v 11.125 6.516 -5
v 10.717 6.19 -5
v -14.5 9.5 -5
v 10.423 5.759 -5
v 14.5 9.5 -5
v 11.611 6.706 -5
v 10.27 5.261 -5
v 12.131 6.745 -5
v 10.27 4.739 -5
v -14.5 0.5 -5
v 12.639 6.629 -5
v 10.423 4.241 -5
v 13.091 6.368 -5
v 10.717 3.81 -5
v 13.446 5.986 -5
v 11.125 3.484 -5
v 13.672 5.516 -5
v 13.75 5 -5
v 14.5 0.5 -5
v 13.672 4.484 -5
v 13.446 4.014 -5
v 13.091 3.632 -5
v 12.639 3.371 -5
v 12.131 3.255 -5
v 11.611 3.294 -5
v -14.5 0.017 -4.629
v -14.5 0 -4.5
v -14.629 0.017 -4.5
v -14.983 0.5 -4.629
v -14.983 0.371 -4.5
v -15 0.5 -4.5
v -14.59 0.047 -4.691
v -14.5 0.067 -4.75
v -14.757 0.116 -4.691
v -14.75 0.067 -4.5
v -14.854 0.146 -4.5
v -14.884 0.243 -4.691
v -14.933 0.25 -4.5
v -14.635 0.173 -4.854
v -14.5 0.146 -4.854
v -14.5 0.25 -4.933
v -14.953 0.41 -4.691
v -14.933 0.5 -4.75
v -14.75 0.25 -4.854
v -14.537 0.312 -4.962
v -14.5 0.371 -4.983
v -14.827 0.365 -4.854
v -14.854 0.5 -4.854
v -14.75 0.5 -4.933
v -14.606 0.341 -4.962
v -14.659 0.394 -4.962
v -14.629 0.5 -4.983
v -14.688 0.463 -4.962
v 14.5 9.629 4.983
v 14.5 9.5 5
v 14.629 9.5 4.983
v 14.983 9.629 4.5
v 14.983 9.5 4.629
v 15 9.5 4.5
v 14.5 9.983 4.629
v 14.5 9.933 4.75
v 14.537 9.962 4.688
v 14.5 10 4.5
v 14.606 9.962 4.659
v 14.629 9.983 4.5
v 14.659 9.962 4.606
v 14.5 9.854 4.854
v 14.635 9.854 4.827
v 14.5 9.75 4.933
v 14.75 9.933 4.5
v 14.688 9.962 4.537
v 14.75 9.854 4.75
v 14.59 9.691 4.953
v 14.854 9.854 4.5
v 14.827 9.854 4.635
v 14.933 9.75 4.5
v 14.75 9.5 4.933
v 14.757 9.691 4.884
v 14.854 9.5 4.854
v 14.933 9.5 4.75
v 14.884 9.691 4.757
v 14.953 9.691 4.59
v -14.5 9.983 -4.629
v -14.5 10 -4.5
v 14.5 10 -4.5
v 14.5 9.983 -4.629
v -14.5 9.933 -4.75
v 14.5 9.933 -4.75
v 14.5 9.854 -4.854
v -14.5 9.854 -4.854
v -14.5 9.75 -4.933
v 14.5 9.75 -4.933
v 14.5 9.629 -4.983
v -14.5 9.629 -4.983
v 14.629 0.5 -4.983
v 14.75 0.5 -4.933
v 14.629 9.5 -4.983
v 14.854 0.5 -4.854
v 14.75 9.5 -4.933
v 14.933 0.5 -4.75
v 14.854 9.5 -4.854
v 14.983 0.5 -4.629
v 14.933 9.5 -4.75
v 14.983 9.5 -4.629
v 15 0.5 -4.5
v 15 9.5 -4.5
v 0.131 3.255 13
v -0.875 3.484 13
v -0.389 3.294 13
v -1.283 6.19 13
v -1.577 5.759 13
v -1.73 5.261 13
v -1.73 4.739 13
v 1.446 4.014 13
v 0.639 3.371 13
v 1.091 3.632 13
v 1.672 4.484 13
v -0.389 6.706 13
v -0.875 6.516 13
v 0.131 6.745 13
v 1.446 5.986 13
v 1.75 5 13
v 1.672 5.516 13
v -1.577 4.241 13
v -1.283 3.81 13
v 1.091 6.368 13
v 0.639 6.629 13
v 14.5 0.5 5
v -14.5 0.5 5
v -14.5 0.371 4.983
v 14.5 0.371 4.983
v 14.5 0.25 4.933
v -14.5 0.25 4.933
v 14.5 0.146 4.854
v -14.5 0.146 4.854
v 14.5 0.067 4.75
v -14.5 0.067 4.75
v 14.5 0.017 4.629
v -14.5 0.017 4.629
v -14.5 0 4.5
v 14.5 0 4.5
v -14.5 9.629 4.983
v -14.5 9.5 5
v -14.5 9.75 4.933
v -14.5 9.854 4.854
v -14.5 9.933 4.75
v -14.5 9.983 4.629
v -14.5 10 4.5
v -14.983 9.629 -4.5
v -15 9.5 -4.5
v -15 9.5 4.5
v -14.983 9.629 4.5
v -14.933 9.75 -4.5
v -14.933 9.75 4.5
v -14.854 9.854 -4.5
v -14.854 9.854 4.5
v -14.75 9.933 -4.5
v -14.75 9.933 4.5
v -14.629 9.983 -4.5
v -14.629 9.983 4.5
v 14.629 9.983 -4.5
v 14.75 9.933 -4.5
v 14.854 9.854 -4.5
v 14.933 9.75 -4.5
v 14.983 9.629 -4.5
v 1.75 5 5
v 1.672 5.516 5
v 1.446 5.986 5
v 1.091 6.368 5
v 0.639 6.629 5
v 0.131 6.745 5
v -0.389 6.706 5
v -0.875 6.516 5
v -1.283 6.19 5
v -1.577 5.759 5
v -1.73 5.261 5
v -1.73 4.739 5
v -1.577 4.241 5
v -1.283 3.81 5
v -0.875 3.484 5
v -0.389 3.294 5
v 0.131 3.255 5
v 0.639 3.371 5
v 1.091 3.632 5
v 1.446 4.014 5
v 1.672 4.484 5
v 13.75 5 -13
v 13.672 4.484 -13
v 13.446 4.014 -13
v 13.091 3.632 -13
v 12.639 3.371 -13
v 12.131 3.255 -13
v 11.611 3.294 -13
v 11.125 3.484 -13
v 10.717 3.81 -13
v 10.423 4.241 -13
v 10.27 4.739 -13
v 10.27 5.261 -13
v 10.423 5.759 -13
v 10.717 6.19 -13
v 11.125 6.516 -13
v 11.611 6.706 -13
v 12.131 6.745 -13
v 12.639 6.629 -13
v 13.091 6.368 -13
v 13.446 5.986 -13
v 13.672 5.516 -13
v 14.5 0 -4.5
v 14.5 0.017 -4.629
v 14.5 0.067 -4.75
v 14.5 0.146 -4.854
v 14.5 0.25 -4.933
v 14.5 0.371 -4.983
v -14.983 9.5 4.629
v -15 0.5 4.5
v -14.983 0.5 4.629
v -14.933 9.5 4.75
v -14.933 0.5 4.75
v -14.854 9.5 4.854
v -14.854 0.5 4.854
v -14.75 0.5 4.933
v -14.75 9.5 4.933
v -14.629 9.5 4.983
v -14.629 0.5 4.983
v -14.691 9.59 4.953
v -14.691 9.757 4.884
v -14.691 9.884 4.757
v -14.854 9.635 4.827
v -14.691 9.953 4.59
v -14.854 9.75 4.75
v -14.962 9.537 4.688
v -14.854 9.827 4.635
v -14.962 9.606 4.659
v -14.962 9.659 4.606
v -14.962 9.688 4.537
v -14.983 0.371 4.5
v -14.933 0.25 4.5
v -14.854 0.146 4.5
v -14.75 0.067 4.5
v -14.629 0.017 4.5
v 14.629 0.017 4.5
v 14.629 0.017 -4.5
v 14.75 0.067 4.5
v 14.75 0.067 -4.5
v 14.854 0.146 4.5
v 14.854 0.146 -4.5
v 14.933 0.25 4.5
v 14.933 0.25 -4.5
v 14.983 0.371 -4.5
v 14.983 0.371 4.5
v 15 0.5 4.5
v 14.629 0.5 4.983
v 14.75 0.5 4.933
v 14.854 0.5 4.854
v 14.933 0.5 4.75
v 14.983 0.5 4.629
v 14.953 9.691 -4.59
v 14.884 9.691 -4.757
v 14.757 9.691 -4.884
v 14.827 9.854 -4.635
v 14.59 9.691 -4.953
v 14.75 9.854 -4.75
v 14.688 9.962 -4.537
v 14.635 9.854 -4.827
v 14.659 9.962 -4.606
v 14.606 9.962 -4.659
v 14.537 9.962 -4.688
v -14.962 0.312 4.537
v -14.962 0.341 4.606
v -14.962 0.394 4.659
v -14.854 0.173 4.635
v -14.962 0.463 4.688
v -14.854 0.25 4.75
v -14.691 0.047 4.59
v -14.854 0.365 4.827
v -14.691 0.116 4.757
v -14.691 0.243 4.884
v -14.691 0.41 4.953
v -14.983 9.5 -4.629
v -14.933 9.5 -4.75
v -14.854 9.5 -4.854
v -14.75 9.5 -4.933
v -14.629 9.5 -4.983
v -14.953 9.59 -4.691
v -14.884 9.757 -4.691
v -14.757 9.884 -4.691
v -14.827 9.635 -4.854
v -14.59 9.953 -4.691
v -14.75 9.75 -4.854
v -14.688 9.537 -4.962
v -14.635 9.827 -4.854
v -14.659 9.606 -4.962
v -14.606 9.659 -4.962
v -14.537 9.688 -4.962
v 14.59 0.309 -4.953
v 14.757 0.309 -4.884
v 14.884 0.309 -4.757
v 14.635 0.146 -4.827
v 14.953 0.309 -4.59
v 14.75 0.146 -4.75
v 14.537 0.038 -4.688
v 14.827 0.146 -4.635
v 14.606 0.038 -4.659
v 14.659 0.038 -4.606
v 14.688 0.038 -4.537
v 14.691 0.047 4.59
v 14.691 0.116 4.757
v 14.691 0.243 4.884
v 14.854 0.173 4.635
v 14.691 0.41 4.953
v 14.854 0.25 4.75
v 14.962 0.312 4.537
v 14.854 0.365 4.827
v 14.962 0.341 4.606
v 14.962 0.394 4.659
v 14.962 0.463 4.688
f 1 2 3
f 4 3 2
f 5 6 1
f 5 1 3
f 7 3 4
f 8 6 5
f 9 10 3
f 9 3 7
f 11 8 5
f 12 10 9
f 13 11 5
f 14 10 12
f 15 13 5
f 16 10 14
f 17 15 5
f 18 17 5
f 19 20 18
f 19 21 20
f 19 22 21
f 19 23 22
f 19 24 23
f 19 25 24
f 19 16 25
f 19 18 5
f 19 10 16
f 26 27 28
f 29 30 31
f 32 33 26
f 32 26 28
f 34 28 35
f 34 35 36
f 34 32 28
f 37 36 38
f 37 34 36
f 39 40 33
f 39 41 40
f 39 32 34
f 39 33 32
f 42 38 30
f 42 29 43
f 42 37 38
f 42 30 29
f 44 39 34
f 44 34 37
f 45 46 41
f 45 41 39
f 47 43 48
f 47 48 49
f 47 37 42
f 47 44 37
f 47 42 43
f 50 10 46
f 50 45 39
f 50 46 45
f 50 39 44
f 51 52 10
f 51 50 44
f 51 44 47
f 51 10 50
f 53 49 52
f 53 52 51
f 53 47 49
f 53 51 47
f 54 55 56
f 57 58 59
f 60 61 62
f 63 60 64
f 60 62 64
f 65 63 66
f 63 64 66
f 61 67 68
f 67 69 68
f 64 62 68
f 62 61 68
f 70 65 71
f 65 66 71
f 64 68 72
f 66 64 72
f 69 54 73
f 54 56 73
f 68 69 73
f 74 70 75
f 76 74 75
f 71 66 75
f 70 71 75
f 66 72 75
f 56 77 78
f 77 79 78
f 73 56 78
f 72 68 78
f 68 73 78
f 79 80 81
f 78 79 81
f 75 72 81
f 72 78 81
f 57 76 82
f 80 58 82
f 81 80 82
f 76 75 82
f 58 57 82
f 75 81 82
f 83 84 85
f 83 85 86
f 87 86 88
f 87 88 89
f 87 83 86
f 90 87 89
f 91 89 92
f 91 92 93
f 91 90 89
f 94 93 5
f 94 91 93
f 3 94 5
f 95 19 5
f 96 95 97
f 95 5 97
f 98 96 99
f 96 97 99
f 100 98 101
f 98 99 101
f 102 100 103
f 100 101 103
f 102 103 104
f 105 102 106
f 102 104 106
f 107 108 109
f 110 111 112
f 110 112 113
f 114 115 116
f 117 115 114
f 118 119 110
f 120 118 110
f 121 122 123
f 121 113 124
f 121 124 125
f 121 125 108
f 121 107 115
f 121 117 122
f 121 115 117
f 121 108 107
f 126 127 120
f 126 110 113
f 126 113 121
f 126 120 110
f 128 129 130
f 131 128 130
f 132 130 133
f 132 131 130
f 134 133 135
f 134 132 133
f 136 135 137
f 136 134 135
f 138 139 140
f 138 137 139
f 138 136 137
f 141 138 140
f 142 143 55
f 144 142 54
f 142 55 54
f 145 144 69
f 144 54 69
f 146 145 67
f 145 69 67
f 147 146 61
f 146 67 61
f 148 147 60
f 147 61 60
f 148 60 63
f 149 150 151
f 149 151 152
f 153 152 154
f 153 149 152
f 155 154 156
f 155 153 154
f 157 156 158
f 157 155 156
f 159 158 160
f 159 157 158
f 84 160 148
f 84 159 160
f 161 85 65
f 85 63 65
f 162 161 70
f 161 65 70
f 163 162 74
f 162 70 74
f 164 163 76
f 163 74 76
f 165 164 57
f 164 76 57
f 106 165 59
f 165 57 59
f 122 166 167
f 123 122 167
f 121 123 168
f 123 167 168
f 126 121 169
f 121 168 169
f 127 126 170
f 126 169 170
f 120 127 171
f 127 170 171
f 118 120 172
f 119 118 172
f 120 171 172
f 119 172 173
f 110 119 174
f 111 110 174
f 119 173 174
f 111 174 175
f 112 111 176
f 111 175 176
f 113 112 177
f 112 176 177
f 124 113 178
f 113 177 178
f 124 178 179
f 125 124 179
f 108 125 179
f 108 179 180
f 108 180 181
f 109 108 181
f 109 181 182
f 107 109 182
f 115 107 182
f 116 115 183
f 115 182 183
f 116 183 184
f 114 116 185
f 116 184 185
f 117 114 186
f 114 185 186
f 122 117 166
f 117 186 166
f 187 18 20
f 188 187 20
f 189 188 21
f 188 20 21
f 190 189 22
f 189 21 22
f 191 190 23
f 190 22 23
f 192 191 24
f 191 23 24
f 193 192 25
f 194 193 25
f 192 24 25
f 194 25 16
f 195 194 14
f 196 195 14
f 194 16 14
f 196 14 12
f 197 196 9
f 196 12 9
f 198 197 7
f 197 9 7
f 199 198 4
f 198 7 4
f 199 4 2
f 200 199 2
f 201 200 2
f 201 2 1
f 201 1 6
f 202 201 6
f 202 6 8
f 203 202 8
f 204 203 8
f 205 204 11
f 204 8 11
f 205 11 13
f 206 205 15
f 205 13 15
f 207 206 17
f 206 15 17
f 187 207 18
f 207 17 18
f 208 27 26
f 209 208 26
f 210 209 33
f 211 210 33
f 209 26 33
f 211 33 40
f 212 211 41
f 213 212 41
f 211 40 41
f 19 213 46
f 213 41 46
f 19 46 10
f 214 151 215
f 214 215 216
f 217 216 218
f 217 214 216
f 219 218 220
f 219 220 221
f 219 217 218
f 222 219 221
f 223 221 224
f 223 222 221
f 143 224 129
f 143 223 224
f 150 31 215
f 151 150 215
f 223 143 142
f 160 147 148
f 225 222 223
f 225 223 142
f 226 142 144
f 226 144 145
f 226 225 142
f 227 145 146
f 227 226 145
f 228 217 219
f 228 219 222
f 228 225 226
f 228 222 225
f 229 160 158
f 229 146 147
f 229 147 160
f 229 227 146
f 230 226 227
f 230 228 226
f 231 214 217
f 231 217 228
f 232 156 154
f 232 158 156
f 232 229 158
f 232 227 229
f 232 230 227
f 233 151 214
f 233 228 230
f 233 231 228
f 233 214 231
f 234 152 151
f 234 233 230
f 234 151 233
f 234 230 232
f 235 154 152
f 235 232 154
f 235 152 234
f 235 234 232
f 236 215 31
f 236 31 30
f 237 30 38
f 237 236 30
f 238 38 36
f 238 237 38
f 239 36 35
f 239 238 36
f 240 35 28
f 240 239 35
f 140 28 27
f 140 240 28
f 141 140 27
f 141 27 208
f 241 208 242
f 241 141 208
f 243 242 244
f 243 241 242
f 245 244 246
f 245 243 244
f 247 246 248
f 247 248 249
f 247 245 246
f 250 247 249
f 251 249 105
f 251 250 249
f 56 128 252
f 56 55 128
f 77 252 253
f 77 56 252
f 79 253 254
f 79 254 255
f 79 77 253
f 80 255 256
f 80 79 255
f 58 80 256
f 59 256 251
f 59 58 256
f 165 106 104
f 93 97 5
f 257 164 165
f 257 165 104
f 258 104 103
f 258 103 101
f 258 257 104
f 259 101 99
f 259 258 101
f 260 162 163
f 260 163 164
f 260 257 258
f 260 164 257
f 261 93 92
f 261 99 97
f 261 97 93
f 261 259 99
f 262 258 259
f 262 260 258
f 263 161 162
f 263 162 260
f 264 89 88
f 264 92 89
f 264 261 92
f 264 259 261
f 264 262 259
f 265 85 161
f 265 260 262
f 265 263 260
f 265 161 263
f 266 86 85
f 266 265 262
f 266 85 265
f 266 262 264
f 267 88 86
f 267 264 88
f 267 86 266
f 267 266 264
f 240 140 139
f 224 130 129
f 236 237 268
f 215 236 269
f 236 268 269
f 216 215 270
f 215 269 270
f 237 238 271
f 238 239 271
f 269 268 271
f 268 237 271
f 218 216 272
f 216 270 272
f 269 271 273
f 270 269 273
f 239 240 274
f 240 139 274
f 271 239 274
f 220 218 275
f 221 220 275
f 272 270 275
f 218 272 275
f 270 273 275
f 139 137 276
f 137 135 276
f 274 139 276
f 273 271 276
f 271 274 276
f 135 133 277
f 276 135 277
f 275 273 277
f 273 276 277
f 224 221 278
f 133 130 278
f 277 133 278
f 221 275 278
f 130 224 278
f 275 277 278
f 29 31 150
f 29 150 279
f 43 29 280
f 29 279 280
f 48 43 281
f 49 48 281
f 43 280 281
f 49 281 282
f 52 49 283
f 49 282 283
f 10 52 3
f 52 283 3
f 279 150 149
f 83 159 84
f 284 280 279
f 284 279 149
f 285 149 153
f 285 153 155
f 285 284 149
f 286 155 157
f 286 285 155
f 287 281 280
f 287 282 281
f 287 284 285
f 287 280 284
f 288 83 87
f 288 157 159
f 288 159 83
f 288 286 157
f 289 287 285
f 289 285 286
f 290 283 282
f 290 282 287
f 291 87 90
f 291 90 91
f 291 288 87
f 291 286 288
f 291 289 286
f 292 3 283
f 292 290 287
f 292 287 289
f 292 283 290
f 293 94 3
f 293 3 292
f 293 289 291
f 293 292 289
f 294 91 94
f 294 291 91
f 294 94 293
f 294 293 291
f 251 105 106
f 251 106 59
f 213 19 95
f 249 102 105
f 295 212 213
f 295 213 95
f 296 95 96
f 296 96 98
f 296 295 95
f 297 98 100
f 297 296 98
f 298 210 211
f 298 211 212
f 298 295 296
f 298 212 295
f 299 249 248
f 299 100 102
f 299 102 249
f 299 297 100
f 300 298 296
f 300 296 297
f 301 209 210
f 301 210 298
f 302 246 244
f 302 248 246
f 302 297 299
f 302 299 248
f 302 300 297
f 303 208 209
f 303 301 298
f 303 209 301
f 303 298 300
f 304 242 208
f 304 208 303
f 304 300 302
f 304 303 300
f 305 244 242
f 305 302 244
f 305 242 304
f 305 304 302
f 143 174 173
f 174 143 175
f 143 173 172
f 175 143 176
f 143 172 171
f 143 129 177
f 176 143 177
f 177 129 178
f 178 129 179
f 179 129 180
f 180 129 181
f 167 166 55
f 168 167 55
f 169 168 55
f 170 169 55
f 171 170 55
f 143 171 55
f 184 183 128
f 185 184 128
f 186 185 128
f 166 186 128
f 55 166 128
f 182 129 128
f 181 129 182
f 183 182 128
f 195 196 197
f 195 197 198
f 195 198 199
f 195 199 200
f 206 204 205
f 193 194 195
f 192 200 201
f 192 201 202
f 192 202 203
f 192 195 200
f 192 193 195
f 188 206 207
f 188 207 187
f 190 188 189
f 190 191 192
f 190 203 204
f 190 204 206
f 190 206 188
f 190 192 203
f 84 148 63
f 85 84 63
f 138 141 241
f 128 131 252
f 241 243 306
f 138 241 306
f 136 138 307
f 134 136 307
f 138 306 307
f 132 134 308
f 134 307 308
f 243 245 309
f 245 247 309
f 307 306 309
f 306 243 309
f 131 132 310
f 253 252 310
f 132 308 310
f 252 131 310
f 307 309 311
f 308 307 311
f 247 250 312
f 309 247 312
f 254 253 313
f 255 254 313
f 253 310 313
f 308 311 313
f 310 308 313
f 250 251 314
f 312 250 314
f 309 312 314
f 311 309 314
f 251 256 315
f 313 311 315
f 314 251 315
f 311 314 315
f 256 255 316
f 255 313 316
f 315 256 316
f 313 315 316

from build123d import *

# Parameters (mm, degrees)
F0_W         = 30
F0_H         = 10
F1_DEPTH     = 10
F2_R         = 1.75
F3_DEPTH     = 8
F4_R         = 1.75
F5_DEPTH     = 8
F6_R         = 0.5
F7_R         = 0.5
F8_T1_DEPTH  = 29
F8_T3_DEPTH  = 9
F8_T5_DEPTH  = 9
F8_S9_W      = 0.5
F8_S9_H      = 0.5
F8_T10_DEPTH = 0.5
F8_S15_W     = 0.5
F8_S15_H     = 0.5
F8_T16_DEPTH = 0.5
F8_S21_W     = 0.5
F8_S21_H     = 0.5
F8_T22_DEPTH = 0.5
F8_S27_W     = 0.5
F8_S27_H     = 0.5
F8_T28_DEPTH = 0.5
F8_T32_ANGLE = 90


# Not quite as in the source:
# - a fillet or chamfer that OpenCascade refuses, or shapes differently, is made with other operations: its cross-section is extruded or revolved along the edge and cut away or added


with BuildPart() as f1:
    # F0 (on Front) → F1 (new body)
    with BuildSketch(Plane.XZ):
        Rectangle(F0_W, F0_H)
    extrude(amount=-F1_DEPTH)

    # F2 (on face) → F3 (join)
    with BuildSketch(Plane.XY.offset(5)):
        with Locations((0, 5)):
            Circle(F2_R)
    extrude(amount=F3_DEPTH)

    # F4 (on face) → F5 (join)
    with BuildSketch(Plane(origin=(0, 0, -5), x_dir=(1, 0, 0), z_dir=(0, 0, -1))):
        with Locations((12, -5)):
            Circle(F4_R)
    extrude(amount=F5_DEPTH)

    # F6
    f6_edges = [f1.edges().sort_by_distance(p)[0] for p in [
        (0, 0, 5),
    ]]
    fillet(f6_edges, radius=F6_R)

    # F7
    f7_edges = [f1.edges().sort_by_distance(p)[0] for p in [
        (15, 5.25, 5),
        (-15, 5.25, 5),
        (0, 10, 5),
        (15, 5, -5),
        (15, 10, 0),
    ]]
    fillet(f7_edges, radius=F7_R)

    # F8: fillet of radius 0.5 on 3 edges, made by hand

    # F8_s2 → F8_t1 (cut)
    with BuildSketch(Plane.YZ.offset(-14.5)):
        with BuildLine():
            ThreePointArc((10, -4.5), (9.8535533906, -4.8535533906), (9.5, -5))
            Line((9.5, -5), (10, -5))
            Line((10, -5), (10, -4.5))
        make_face()
        with BuildLine():
            ThreePointArc((0, -4.5), (0.1464466094, -4.8535533906), (0.5, -5))
            Line((0.5, -5), (0, -5))
            Line((0, -5), (0, -4.5))
        make_face()
    extrude(amount=F8_T1_DEPTH, mode=Mode.SUBTRACT)

    # F8_s4 → F8_t3 (cut)
    with BuildSketch(Plane.XY.offset(-4.5)):
        with BuildLine():
            ThreePointArc((-15, 9.5), (-14.8535533906, 9.8535533906), (-14.5, 10))
            Line((-14.5, 10), (-15, 10))
            Line((-15, 10), (-15, 9.5))
        make_face()
    extrude(amount=F8_T3_DEPTH, mode=Mode.SUBTRACT)

    # F8_s6 → F8_t5 (cut)
    with BuildSketch(Plane.XZ.offset(-9.5)):
        with BuildLine():
            ThreePointArc((-15, -4.5), (-14.8535533906, -4.8535533906), (-14.5, -5))
            Line((-14.5, -5), (-15, -5))
            Line((-15, -5), (-15, -4.5))
        make_face()
    extrude(amount=F8_T5_DEPTH, mode=Mode.SUBTRACT)


with BuildPart() as f8_tool8:
    # F8_s9 → F8_t10 (new body)
    with BuildSketch(Plane.YZ.offset(-14.5)):
        with Locations((9.75, 4.75)):
            Rectangle(F8_S9_W, F8_S9_H)
    extrude(amount=-F8_T10_DEPTH)

    # F8_s11 → F8_t12 (revolve, cut)
    with BuildSketch(Plane(origin=(-14.5, 9.5, 4.5), x_dir=(0, -0.7071067812, -0.7071067812), z_dir=(0, 0.7071067812, -0.7071067812))):
        with BuildLine():
            ThreePointArc((0, -0.5), (0.5, 0), (0, 0.5))
            Line((0, 0.5), (0, -0.5))
        make_face()
    revolve(axis=Axis((-14.5, 9.5, 4.5), (-1, 0, 0)), mode=Mode.SUBTRACT)


with BuildPart() as f1_1:
    add(f1.part)

    # F8_t7: cut F8_tool8
    add(f8_tool8.part, mode=Mode.SUBTRACT)


with BuildPart() as f8_tool14:
    # F8_s15 → F8_t16 (new body)
    with BuildSketch(Plane.XZ.offset(-0.5)):
        with Locations((14.75, -4.75)):
            Rectangle(F8_S15_W, F8_S15_H)
    extrude(amount=F8_T16_DEPTH)

    # F8_s17 → F8_t18 (revolve, cut)
    with BuildSketch(Plane(origin=(14.5, 0.5, -4.5), x_dir=(-0.7071067812, 0, 0.7071067812), z_dir=(0.7071067812, 0, 0.7071067812))):
        with BuildLine():
            ThreePointArc((0, -0.5), (0.5, 0), (0, 0.5))
            Line((0, 0.5), (0, -0.5))
        make_face()
    revolve(axis=Axis((14.5, 0.5, -4.5), (0, -1, 0)), mode=Mode.SUBTRACT)


with BuildPart() as f1_2:
    add(f1_1.part)

    # F8_t13: cut F8_tool14
    add(f8_tool14.part, mode=Mode.SUBTRACT)


with BuildPart() as f8_tool20:
    # F8_s21 → F8_t22 (new body)
    with BuildSketch(Plane.XZ.offset(-9.5)):
        with Locations((14.75, -4.75)):
            Rectangle(F8_S21_W, F8_S21_H)
    extrude(amount=-F8_T22_DEPTH)

    # F8_s23 → F8_t24 (revolve, cut)
    with BuildSketch(Plane(origin=(14.5, 9.5, -4.5), x_dir=(-0.7071067812, 0, 0.7071067812), z_dir=(-0.7071067812, 0, -0.7071067812))):
        with BuildLine():
            ThreePointArc((0, -0.5), (0.5, 0), (0, 0.5))
            Line((0, 0.5), (0, -0.5))
        make_face()
    revolve(axis=Axis((14.5, 9.5, -4.5), (0, 1, 0)), mode=Mode.SUBTRACT)


with BuildPart() as f1_3:
    add(f1_2.part)

    # F8_t19: cut F8_tool20
    add(f8_tool20.part, mode=Mode.SUBTRACT)


with BuildPart() as f8_tool26:
    # F8_s27 → F8_t28 (new body)
    with BuildSketch(Plane.XY.offset(-4.5)):
        with Locations((-14.75, 9.75)):
            Rectangle(F8_S27_W, F8_S27_H)
    extrude(amount=-F8_T28_DEPTH)

    # F8_s29 → F8_t30 (revolve, cut)
    with BuildSketch(Plane(origin=(-14.5, 9.5, -4.5), x_dir=(0.7071067812, -0.7071067812, 0), z_dir=(0.7071067812, 0.7071067812, 0))):
        with BuildLine():
            ThreePointArc((0, -0.5), (0.5, 0), (0, 0.5))
            Line((0, 0.5), (0, -0.5))
        make_face()
    revolve(axis=Axis((-14.5, 9.5, -4.5), (0, 0, -1)), mode=Mode.SUBTRACT)


with BuildPart() as f1_4:
    add(f1_3.part)

    # F8_t25: cut F8_tool26
    add(f8_tool26.part, mode=Mode.SUBTRACT)

    # F8_s31 → F8_t32 (revolve, cut)
    with BuildSketch(Plane.YZ.offset(-14.5)):
        with BuildLine():
            ThreePointArc((0, -4.5), (0.1464466094, -4.8535533906), (0.5, -5))
            Line((0.5, -5), (0, -5))
            Line((0, -5), (0, -4.5))
        make_face()
    revolve(axis=Axis((-14.5, 0.5, -5), (0, 0, -1)), revolution_arc=F8_T32_ANGLE, mode=Mode.SUBTRACT)


solid = f1_4.part
